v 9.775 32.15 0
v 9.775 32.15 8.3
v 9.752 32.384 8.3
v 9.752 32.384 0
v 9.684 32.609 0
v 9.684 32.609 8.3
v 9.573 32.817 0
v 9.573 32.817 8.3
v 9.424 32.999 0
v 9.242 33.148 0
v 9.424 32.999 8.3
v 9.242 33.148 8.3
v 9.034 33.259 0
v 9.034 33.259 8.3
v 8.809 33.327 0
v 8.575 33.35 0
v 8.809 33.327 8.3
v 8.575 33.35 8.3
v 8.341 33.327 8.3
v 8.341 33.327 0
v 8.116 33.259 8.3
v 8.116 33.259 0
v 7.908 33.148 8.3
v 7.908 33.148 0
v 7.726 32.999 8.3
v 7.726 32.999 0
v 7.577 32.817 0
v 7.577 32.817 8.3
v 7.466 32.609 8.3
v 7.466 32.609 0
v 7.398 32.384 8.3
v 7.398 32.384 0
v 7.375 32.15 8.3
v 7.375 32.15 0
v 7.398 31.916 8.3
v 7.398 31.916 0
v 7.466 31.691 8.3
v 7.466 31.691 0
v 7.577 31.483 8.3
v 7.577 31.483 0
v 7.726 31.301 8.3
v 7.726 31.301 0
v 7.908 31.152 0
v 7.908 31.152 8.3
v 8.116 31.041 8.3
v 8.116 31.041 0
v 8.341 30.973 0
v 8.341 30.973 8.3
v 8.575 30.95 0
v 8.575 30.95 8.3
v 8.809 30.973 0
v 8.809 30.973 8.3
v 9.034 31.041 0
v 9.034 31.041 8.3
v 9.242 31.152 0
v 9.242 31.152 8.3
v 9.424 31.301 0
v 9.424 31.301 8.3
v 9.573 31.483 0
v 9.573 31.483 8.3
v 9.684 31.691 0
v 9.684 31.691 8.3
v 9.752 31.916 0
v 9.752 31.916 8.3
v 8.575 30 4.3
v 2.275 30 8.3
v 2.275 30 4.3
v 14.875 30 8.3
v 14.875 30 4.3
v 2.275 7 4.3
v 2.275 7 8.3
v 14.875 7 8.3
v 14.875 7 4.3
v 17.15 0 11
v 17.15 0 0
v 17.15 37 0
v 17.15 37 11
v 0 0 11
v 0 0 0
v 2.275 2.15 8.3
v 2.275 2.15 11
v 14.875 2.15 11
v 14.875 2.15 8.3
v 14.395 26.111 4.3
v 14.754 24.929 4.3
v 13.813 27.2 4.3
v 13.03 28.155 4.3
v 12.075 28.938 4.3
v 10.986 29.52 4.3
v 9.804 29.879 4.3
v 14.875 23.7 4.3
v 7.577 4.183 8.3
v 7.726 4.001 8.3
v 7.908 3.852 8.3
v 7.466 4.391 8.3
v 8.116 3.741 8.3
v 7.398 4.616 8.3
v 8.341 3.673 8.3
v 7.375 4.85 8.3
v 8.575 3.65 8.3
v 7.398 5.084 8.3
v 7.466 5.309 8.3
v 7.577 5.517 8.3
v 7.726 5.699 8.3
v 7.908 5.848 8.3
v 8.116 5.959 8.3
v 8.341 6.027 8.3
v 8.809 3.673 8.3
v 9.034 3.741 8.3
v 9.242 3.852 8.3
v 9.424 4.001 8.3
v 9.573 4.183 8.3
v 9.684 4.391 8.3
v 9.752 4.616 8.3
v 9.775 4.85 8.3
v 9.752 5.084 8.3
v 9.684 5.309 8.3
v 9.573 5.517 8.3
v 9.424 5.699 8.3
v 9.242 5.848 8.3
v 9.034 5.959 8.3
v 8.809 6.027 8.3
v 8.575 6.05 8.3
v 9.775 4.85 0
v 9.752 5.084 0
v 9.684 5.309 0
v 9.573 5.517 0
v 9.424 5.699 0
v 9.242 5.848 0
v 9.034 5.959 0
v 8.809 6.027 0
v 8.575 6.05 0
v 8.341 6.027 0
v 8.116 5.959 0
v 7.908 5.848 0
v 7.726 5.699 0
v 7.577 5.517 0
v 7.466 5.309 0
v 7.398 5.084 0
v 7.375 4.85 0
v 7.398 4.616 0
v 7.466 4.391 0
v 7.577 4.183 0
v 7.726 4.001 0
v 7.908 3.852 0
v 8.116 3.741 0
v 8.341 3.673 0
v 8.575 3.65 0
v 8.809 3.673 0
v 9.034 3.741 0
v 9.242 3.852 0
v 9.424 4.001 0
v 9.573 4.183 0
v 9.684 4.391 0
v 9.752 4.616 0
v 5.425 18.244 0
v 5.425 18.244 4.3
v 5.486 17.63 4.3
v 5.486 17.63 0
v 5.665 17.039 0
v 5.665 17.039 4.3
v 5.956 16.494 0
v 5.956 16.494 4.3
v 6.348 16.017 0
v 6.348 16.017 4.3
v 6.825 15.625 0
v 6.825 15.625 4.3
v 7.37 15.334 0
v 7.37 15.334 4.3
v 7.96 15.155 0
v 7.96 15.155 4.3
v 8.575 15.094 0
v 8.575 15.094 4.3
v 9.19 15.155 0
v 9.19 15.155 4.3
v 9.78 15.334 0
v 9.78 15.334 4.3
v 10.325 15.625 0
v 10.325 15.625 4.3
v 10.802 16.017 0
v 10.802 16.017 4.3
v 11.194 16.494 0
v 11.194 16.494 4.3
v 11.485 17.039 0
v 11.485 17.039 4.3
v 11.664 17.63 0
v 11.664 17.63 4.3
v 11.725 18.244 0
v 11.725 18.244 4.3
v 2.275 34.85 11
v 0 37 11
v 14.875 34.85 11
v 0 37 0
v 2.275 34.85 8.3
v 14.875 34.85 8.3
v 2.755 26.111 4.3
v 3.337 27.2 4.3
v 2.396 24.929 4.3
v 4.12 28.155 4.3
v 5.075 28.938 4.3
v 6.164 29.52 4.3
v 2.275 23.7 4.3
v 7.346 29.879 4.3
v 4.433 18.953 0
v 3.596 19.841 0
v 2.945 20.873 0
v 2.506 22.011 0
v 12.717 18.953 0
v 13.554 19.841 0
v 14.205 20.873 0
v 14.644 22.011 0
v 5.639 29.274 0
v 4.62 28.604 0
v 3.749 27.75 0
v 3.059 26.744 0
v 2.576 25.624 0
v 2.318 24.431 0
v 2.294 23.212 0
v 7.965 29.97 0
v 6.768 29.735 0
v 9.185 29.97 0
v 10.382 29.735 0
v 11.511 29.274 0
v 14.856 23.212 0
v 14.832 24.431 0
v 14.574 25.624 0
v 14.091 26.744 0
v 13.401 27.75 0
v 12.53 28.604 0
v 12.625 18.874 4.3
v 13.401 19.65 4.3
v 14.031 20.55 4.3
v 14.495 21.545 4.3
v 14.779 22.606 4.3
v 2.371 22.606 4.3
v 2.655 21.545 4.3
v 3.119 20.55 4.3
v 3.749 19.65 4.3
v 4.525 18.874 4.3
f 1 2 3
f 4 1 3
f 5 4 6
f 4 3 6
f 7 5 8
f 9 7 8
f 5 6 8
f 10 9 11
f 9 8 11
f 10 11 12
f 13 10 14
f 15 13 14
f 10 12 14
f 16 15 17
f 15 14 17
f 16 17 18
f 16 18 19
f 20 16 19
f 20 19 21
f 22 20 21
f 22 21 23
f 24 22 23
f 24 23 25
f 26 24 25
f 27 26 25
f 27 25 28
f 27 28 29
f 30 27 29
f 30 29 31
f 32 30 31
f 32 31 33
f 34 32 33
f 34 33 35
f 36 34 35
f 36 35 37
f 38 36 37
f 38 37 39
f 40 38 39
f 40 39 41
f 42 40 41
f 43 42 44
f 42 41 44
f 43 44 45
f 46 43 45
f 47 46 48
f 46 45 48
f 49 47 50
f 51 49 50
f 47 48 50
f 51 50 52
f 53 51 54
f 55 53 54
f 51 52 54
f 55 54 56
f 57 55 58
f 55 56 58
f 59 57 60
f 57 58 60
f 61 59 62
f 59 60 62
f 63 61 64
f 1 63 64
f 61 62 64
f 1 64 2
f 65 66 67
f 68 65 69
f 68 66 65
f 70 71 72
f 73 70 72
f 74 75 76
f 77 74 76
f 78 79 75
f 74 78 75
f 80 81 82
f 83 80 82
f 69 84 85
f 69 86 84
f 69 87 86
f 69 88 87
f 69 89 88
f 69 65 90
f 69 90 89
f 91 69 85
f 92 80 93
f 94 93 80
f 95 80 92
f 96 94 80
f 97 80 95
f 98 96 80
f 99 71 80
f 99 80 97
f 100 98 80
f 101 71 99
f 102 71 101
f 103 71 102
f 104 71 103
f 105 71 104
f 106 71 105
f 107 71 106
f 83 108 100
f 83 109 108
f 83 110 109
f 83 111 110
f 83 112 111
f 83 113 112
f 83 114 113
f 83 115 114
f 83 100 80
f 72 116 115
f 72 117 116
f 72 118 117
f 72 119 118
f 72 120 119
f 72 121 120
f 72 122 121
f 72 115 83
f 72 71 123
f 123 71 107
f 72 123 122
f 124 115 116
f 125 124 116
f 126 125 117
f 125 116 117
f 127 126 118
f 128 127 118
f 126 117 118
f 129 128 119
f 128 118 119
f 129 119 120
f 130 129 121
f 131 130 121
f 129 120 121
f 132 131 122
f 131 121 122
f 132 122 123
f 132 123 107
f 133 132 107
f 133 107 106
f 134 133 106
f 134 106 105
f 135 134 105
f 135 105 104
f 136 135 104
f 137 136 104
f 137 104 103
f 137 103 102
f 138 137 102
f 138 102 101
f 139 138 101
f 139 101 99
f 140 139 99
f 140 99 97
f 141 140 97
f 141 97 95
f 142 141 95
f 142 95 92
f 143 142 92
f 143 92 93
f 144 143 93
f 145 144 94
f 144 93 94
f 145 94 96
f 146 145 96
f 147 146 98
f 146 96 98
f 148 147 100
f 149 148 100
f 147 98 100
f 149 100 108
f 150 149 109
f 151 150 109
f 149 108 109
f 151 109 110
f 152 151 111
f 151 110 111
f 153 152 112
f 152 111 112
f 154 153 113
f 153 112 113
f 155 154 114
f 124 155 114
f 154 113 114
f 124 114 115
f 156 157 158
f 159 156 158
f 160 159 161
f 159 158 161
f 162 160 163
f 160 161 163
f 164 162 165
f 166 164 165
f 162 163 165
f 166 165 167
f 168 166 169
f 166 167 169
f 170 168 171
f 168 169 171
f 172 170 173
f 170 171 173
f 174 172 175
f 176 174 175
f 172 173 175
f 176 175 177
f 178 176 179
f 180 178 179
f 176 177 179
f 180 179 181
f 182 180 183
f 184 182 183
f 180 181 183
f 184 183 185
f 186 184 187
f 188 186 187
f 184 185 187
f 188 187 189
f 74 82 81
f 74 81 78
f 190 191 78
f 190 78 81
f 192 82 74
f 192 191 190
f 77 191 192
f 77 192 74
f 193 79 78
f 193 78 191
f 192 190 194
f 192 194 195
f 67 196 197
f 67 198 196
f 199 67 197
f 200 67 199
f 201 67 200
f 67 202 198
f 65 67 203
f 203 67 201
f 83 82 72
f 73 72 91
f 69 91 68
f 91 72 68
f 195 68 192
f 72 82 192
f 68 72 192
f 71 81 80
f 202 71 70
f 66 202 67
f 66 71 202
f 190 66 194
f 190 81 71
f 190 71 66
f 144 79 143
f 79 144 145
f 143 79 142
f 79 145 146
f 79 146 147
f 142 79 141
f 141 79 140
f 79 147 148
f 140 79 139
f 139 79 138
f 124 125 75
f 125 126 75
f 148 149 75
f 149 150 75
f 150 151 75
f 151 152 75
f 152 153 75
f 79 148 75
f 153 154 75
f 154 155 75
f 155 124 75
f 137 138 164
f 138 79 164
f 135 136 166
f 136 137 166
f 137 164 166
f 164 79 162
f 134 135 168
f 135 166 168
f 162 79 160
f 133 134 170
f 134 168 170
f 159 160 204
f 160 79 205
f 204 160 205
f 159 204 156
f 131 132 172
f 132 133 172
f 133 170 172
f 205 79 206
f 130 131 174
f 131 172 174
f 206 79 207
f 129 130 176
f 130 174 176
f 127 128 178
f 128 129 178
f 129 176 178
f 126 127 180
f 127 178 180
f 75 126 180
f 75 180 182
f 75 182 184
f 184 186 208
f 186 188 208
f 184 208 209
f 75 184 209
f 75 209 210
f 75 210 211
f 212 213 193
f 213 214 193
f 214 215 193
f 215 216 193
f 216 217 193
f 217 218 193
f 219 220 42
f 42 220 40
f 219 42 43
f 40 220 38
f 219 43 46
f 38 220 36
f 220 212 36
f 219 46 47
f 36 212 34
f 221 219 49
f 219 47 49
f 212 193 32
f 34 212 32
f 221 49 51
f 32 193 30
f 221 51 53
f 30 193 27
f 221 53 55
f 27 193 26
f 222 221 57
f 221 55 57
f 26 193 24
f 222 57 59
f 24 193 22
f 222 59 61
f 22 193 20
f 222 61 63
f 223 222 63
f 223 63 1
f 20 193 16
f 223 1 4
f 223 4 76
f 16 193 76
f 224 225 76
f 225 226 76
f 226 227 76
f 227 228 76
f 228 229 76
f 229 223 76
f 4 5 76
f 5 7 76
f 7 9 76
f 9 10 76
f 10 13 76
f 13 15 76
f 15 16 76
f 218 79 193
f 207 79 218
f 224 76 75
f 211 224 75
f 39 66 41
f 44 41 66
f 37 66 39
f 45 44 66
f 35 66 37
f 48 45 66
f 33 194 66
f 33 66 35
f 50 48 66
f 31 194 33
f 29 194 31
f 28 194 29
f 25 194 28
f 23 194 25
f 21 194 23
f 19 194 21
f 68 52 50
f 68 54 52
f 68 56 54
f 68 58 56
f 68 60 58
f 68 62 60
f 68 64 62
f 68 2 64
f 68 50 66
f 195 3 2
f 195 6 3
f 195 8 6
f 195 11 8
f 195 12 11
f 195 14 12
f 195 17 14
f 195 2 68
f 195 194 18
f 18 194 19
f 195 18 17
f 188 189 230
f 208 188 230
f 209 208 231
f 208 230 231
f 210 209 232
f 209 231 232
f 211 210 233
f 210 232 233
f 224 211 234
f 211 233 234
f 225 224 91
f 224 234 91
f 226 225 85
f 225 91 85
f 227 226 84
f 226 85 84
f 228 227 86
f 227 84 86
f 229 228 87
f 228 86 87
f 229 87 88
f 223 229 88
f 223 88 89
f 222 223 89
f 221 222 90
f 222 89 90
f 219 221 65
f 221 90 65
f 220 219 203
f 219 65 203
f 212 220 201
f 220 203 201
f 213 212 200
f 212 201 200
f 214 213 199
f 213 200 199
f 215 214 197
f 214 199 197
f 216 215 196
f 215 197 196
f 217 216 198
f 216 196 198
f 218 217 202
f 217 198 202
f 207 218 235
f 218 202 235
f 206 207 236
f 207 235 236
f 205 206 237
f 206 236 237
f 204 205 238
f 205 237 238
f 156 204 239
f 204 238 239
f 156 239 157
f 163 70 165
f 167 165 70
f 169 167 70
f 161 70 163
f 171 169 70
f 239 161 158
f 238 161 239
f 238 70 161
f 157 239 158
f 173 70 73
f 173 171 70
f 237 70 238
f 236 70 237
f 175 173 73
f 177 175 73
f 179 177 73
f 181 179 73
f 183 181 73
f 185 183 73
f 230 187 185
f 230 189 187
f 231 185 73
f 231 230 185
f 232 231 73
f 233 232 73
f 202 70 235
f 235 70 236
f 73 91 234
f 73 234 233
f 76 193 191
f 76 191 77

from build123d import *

# Parameters (mm, degrees)
SKETCH_W        = 17.15
SKETCH_H        = 37
PAD_DEPTH       = 11
SKETCH001_W     = 12.6
SKETCH001_H     = 32.7
POCKET_DEPTH    = 2.7
SKETCH002_W     = 12.6
SKETCH002_H     = 23
POCKET001_DEPTH = 4
POCKET002_DEPTH = 4.3
SKETCH004_R     = 1.2
POCKET003_DEPTH = 8.301


with BuildPart() as part:
    # Sketch → Pad (new body)
    with BuildSketch(Plane.XY):
        with Locations((8.575, 18.5)):
            Rectangle(SKETCH_W, SKETCH_H)
    extrude(amount=PAD_DEPTH)

    # Sketch001 (on Face6 of Pad) → Pocket (cut)
    with BuildSketch(Plane.XY.offset(11)):
        with Locations((8.575, 18.5)):
            Rectangle(SKETCH001_W, SKETCH001_H)
    extrude(amount=-POCKET_DEPTH, mode=Mode.SUBTRACT)

    # Sketch002 (on Face11 of Pocket) → Pocket001 (cut)
    with BuildSketch(Plane.XY.offset(8.3)):
        with Locations((8.575, 18.5)):
            Rectangle(SKETCH002_W, SKETCH002_H)
    extrude(amount=-POCKET001_DEPTH, mode=Mode.SUBTRACT)

    # Sketch003 (on Face17 of Pocket001) → Pocket002 (cut)
    with BuildSketch(Plane.XY.offset(4.3)):
        with BuildLine():
            ThreePointArc((11.725, 18.24404), (8.575, 30), (5.425, 18.24404))
            ThreePointArc((5.425, 18.24404), (8.575, 15.09404), (11.725, 18.24404))
        make_face()
    extrude(amount=-POCKET002_DEPTH, mode=Mode.SUBTRACT)

    # Sketch004 (on Face18 of Pocket002) → Pocket003 (cut, through all)
    with BuildSketch(Plane.XY.offset(8.3)):
        with Locations((8.575, 32.15)):
            Circle(SKETCH004_R)
        with Locations((8.575, 4.85)):
            Circle(SKETCH004_R)
    extrude(amount=-POCKET003_DEPTH, mode=Mode.SUBTRACT)


solid = part.part
